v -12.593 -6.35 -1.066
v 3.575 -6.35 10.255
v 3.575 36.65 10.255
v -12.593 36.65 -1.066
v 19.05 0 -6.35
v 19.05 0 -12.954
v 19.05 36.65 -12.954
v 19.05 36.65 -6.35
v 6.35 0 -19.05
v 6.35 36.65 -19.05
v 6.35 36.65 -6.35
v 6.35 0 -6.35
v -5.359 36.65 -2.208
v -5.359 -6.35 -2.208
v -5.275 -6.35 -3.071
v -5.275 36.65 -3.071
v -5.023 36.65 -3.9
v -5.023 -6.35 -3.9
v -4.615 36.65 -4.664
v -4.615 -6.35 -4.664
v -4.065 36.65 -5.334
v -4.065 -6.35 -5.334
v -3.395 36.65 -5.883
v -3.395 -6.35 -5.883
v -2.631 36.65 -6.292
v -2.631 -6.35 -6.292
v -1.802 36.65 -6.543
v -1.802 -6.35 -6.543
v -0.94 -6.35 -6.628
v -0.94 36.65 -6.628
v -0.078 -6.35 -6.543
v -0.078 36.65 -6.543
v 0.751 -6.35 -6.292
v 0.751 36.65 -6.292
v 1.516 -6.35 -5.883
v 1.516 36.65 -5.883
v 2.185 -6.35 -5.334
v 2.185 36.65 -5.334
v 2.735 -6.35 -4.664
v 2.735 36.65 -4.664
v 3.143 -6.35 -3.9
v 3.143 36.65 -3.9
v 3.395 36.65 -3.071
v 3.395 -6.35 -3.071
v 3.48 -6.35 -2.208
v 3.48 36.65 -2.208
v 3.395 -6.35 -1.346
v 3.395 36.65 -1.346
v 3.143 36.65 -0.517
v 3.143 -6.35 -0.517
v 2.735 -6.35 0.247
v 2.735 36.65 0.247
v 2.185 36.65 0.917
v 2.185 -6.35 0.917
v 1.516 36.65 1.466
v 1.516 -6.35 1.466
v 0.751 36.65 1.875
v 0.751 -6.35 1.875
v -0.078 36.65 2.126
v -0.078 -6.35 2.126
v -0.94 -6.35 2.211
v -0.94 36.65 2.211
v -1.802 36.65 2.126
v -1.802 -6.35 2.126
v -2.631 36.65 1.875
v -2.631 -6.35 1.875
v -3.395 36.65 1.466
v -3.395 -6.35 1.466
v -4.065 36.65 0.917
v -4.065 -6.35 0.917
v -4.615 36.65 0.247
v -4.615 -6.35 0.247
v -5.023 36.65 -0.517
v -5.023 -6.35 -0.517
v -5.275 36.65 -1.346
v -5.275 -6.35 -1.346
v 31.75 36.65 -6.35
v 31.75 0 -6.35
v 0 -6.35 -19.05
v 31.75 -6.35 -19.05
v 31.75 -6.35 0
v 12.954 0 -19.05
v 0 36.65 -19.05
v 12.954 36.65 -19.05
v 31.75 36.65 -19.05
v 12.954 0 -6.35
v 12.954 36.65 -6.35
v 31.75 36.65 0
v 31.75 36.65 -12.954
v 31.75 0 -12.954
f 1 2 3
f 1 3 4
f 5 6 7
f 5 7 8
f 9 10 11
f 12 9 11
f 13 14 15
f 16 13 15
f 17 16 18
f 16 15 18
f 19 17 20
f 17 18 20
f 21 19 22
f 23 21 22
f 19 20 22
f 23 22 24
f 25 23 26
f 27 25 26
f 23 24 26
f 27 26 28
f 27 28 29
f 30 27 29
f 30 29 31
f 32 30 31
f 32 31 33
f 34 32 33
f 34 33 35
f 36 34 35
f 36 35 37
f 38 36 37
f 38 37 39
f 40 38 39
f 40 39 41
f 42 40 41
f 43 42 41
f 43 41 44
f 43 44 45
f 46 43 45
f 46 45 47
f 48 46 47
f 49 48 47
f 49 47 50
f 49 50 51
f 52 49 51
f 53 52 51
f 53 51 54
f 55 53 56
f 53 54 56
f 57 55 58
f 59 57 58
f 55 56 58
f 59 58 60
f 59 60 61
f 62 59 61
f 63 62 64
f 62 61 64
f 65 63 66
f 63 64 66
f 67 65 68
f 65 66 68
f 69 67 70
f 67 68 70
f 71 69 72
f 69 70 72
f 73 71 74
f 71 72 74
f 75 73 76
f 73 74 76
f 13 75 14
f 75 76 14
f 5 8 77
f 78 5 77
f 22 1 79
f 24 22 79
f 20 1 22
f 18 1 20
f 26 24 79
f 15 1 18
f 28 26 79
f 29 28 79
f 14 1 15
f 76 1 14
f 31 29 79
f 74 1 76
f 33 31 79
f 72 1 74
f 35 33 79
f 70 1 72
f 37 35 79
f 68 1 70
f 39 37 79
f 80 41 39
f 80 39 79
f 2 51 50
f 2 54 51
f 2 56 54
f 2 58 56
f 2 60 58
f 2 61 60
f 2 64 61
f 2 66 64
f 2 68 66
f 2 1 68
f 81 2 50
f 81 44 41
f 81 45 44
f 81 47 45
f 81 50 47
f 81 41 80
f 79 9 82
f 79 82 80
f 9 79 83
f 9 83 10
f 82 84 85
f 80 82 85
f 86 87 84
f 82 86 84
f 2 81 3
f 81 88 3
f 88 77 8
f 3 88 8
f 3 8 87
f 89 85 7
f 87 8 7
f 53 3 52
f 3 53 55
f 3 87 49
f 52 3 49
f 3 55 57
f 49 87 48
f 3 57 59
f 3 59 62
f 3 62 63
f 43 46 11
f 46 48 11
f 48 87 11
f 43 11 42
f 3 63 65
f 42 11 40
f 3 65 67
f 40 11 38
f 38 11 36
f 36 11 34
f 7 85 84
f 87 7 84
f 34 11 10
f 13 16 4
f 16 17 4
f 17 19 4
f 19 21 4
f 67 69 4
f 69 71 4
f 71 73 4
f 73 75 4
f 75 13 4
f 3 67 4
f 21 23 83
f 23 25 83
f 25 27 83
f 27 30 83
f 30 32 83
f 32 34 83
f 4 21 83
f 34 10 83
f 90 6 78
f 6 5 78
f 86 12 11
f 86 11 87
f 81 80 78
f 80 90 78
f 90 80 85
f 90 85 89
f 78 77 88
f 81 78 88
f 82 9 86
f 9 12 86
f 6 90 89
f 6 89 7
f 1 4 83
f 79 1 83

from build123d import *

# Parameters (mm, degrees)
BOSS_EXTRUDE1_DEPTH      = 36.650000106
BOSS_EXTRUDE3_DEPTH      = 6.35
S_0_348_DIAMETER_HOLE1_D = 8.8392


with BuildPart() as part:
    # Sketch1 → Boss-Extrude1 (new body)
    with BuildSketch(Plane(origin=(0, 0, 0), x_dir=(1, 0, 0), z_dir=(0, 1, 0))):
        Polygon((12.954, 19.05), (31.75, 19.05), (31.75, 12.954), (19.05, 12.954), (19.05, 6.35), (31.75, 6.35), (31.75, 0), (3.574718809, -10.254963696), (-12.592782584, 1.065642654), (0, 19.05), (6.35, 19.05), (6.35, 6.35), (12.954, 6.35), align=None)
    extrude(amount=BOSS_EXTRUDE1_DEPTH)

    # Sketch8 → Boss-Extrude3 (add)
    with BuildSketch(Plane.XZ):
        Polygon((6.35, -19.05), (12.954, -19.05), (31.75, -19.05), (31.75, -12.954), (31.75, -6.35), (31.75, 0), (3.574718809, 10.254963696), (-12.592782584, -1.065642654), (0, -19.05), align=None)
    extrude(amount=BOSS_EXTRUDE3_DEPTH)

    # S (0.348) Diameter Hole1 (through all)
    with Locations(Plane(origin=(0, 36.650000106, 0), x_dir=(1, 0, 0), z_dir=(0, 1, 0))):
        with Locations((-0.939868465, 2.208486712)):
            Hole(S_0_348_DIAMETER_HOLE1_D / 2)


solid = part.part
